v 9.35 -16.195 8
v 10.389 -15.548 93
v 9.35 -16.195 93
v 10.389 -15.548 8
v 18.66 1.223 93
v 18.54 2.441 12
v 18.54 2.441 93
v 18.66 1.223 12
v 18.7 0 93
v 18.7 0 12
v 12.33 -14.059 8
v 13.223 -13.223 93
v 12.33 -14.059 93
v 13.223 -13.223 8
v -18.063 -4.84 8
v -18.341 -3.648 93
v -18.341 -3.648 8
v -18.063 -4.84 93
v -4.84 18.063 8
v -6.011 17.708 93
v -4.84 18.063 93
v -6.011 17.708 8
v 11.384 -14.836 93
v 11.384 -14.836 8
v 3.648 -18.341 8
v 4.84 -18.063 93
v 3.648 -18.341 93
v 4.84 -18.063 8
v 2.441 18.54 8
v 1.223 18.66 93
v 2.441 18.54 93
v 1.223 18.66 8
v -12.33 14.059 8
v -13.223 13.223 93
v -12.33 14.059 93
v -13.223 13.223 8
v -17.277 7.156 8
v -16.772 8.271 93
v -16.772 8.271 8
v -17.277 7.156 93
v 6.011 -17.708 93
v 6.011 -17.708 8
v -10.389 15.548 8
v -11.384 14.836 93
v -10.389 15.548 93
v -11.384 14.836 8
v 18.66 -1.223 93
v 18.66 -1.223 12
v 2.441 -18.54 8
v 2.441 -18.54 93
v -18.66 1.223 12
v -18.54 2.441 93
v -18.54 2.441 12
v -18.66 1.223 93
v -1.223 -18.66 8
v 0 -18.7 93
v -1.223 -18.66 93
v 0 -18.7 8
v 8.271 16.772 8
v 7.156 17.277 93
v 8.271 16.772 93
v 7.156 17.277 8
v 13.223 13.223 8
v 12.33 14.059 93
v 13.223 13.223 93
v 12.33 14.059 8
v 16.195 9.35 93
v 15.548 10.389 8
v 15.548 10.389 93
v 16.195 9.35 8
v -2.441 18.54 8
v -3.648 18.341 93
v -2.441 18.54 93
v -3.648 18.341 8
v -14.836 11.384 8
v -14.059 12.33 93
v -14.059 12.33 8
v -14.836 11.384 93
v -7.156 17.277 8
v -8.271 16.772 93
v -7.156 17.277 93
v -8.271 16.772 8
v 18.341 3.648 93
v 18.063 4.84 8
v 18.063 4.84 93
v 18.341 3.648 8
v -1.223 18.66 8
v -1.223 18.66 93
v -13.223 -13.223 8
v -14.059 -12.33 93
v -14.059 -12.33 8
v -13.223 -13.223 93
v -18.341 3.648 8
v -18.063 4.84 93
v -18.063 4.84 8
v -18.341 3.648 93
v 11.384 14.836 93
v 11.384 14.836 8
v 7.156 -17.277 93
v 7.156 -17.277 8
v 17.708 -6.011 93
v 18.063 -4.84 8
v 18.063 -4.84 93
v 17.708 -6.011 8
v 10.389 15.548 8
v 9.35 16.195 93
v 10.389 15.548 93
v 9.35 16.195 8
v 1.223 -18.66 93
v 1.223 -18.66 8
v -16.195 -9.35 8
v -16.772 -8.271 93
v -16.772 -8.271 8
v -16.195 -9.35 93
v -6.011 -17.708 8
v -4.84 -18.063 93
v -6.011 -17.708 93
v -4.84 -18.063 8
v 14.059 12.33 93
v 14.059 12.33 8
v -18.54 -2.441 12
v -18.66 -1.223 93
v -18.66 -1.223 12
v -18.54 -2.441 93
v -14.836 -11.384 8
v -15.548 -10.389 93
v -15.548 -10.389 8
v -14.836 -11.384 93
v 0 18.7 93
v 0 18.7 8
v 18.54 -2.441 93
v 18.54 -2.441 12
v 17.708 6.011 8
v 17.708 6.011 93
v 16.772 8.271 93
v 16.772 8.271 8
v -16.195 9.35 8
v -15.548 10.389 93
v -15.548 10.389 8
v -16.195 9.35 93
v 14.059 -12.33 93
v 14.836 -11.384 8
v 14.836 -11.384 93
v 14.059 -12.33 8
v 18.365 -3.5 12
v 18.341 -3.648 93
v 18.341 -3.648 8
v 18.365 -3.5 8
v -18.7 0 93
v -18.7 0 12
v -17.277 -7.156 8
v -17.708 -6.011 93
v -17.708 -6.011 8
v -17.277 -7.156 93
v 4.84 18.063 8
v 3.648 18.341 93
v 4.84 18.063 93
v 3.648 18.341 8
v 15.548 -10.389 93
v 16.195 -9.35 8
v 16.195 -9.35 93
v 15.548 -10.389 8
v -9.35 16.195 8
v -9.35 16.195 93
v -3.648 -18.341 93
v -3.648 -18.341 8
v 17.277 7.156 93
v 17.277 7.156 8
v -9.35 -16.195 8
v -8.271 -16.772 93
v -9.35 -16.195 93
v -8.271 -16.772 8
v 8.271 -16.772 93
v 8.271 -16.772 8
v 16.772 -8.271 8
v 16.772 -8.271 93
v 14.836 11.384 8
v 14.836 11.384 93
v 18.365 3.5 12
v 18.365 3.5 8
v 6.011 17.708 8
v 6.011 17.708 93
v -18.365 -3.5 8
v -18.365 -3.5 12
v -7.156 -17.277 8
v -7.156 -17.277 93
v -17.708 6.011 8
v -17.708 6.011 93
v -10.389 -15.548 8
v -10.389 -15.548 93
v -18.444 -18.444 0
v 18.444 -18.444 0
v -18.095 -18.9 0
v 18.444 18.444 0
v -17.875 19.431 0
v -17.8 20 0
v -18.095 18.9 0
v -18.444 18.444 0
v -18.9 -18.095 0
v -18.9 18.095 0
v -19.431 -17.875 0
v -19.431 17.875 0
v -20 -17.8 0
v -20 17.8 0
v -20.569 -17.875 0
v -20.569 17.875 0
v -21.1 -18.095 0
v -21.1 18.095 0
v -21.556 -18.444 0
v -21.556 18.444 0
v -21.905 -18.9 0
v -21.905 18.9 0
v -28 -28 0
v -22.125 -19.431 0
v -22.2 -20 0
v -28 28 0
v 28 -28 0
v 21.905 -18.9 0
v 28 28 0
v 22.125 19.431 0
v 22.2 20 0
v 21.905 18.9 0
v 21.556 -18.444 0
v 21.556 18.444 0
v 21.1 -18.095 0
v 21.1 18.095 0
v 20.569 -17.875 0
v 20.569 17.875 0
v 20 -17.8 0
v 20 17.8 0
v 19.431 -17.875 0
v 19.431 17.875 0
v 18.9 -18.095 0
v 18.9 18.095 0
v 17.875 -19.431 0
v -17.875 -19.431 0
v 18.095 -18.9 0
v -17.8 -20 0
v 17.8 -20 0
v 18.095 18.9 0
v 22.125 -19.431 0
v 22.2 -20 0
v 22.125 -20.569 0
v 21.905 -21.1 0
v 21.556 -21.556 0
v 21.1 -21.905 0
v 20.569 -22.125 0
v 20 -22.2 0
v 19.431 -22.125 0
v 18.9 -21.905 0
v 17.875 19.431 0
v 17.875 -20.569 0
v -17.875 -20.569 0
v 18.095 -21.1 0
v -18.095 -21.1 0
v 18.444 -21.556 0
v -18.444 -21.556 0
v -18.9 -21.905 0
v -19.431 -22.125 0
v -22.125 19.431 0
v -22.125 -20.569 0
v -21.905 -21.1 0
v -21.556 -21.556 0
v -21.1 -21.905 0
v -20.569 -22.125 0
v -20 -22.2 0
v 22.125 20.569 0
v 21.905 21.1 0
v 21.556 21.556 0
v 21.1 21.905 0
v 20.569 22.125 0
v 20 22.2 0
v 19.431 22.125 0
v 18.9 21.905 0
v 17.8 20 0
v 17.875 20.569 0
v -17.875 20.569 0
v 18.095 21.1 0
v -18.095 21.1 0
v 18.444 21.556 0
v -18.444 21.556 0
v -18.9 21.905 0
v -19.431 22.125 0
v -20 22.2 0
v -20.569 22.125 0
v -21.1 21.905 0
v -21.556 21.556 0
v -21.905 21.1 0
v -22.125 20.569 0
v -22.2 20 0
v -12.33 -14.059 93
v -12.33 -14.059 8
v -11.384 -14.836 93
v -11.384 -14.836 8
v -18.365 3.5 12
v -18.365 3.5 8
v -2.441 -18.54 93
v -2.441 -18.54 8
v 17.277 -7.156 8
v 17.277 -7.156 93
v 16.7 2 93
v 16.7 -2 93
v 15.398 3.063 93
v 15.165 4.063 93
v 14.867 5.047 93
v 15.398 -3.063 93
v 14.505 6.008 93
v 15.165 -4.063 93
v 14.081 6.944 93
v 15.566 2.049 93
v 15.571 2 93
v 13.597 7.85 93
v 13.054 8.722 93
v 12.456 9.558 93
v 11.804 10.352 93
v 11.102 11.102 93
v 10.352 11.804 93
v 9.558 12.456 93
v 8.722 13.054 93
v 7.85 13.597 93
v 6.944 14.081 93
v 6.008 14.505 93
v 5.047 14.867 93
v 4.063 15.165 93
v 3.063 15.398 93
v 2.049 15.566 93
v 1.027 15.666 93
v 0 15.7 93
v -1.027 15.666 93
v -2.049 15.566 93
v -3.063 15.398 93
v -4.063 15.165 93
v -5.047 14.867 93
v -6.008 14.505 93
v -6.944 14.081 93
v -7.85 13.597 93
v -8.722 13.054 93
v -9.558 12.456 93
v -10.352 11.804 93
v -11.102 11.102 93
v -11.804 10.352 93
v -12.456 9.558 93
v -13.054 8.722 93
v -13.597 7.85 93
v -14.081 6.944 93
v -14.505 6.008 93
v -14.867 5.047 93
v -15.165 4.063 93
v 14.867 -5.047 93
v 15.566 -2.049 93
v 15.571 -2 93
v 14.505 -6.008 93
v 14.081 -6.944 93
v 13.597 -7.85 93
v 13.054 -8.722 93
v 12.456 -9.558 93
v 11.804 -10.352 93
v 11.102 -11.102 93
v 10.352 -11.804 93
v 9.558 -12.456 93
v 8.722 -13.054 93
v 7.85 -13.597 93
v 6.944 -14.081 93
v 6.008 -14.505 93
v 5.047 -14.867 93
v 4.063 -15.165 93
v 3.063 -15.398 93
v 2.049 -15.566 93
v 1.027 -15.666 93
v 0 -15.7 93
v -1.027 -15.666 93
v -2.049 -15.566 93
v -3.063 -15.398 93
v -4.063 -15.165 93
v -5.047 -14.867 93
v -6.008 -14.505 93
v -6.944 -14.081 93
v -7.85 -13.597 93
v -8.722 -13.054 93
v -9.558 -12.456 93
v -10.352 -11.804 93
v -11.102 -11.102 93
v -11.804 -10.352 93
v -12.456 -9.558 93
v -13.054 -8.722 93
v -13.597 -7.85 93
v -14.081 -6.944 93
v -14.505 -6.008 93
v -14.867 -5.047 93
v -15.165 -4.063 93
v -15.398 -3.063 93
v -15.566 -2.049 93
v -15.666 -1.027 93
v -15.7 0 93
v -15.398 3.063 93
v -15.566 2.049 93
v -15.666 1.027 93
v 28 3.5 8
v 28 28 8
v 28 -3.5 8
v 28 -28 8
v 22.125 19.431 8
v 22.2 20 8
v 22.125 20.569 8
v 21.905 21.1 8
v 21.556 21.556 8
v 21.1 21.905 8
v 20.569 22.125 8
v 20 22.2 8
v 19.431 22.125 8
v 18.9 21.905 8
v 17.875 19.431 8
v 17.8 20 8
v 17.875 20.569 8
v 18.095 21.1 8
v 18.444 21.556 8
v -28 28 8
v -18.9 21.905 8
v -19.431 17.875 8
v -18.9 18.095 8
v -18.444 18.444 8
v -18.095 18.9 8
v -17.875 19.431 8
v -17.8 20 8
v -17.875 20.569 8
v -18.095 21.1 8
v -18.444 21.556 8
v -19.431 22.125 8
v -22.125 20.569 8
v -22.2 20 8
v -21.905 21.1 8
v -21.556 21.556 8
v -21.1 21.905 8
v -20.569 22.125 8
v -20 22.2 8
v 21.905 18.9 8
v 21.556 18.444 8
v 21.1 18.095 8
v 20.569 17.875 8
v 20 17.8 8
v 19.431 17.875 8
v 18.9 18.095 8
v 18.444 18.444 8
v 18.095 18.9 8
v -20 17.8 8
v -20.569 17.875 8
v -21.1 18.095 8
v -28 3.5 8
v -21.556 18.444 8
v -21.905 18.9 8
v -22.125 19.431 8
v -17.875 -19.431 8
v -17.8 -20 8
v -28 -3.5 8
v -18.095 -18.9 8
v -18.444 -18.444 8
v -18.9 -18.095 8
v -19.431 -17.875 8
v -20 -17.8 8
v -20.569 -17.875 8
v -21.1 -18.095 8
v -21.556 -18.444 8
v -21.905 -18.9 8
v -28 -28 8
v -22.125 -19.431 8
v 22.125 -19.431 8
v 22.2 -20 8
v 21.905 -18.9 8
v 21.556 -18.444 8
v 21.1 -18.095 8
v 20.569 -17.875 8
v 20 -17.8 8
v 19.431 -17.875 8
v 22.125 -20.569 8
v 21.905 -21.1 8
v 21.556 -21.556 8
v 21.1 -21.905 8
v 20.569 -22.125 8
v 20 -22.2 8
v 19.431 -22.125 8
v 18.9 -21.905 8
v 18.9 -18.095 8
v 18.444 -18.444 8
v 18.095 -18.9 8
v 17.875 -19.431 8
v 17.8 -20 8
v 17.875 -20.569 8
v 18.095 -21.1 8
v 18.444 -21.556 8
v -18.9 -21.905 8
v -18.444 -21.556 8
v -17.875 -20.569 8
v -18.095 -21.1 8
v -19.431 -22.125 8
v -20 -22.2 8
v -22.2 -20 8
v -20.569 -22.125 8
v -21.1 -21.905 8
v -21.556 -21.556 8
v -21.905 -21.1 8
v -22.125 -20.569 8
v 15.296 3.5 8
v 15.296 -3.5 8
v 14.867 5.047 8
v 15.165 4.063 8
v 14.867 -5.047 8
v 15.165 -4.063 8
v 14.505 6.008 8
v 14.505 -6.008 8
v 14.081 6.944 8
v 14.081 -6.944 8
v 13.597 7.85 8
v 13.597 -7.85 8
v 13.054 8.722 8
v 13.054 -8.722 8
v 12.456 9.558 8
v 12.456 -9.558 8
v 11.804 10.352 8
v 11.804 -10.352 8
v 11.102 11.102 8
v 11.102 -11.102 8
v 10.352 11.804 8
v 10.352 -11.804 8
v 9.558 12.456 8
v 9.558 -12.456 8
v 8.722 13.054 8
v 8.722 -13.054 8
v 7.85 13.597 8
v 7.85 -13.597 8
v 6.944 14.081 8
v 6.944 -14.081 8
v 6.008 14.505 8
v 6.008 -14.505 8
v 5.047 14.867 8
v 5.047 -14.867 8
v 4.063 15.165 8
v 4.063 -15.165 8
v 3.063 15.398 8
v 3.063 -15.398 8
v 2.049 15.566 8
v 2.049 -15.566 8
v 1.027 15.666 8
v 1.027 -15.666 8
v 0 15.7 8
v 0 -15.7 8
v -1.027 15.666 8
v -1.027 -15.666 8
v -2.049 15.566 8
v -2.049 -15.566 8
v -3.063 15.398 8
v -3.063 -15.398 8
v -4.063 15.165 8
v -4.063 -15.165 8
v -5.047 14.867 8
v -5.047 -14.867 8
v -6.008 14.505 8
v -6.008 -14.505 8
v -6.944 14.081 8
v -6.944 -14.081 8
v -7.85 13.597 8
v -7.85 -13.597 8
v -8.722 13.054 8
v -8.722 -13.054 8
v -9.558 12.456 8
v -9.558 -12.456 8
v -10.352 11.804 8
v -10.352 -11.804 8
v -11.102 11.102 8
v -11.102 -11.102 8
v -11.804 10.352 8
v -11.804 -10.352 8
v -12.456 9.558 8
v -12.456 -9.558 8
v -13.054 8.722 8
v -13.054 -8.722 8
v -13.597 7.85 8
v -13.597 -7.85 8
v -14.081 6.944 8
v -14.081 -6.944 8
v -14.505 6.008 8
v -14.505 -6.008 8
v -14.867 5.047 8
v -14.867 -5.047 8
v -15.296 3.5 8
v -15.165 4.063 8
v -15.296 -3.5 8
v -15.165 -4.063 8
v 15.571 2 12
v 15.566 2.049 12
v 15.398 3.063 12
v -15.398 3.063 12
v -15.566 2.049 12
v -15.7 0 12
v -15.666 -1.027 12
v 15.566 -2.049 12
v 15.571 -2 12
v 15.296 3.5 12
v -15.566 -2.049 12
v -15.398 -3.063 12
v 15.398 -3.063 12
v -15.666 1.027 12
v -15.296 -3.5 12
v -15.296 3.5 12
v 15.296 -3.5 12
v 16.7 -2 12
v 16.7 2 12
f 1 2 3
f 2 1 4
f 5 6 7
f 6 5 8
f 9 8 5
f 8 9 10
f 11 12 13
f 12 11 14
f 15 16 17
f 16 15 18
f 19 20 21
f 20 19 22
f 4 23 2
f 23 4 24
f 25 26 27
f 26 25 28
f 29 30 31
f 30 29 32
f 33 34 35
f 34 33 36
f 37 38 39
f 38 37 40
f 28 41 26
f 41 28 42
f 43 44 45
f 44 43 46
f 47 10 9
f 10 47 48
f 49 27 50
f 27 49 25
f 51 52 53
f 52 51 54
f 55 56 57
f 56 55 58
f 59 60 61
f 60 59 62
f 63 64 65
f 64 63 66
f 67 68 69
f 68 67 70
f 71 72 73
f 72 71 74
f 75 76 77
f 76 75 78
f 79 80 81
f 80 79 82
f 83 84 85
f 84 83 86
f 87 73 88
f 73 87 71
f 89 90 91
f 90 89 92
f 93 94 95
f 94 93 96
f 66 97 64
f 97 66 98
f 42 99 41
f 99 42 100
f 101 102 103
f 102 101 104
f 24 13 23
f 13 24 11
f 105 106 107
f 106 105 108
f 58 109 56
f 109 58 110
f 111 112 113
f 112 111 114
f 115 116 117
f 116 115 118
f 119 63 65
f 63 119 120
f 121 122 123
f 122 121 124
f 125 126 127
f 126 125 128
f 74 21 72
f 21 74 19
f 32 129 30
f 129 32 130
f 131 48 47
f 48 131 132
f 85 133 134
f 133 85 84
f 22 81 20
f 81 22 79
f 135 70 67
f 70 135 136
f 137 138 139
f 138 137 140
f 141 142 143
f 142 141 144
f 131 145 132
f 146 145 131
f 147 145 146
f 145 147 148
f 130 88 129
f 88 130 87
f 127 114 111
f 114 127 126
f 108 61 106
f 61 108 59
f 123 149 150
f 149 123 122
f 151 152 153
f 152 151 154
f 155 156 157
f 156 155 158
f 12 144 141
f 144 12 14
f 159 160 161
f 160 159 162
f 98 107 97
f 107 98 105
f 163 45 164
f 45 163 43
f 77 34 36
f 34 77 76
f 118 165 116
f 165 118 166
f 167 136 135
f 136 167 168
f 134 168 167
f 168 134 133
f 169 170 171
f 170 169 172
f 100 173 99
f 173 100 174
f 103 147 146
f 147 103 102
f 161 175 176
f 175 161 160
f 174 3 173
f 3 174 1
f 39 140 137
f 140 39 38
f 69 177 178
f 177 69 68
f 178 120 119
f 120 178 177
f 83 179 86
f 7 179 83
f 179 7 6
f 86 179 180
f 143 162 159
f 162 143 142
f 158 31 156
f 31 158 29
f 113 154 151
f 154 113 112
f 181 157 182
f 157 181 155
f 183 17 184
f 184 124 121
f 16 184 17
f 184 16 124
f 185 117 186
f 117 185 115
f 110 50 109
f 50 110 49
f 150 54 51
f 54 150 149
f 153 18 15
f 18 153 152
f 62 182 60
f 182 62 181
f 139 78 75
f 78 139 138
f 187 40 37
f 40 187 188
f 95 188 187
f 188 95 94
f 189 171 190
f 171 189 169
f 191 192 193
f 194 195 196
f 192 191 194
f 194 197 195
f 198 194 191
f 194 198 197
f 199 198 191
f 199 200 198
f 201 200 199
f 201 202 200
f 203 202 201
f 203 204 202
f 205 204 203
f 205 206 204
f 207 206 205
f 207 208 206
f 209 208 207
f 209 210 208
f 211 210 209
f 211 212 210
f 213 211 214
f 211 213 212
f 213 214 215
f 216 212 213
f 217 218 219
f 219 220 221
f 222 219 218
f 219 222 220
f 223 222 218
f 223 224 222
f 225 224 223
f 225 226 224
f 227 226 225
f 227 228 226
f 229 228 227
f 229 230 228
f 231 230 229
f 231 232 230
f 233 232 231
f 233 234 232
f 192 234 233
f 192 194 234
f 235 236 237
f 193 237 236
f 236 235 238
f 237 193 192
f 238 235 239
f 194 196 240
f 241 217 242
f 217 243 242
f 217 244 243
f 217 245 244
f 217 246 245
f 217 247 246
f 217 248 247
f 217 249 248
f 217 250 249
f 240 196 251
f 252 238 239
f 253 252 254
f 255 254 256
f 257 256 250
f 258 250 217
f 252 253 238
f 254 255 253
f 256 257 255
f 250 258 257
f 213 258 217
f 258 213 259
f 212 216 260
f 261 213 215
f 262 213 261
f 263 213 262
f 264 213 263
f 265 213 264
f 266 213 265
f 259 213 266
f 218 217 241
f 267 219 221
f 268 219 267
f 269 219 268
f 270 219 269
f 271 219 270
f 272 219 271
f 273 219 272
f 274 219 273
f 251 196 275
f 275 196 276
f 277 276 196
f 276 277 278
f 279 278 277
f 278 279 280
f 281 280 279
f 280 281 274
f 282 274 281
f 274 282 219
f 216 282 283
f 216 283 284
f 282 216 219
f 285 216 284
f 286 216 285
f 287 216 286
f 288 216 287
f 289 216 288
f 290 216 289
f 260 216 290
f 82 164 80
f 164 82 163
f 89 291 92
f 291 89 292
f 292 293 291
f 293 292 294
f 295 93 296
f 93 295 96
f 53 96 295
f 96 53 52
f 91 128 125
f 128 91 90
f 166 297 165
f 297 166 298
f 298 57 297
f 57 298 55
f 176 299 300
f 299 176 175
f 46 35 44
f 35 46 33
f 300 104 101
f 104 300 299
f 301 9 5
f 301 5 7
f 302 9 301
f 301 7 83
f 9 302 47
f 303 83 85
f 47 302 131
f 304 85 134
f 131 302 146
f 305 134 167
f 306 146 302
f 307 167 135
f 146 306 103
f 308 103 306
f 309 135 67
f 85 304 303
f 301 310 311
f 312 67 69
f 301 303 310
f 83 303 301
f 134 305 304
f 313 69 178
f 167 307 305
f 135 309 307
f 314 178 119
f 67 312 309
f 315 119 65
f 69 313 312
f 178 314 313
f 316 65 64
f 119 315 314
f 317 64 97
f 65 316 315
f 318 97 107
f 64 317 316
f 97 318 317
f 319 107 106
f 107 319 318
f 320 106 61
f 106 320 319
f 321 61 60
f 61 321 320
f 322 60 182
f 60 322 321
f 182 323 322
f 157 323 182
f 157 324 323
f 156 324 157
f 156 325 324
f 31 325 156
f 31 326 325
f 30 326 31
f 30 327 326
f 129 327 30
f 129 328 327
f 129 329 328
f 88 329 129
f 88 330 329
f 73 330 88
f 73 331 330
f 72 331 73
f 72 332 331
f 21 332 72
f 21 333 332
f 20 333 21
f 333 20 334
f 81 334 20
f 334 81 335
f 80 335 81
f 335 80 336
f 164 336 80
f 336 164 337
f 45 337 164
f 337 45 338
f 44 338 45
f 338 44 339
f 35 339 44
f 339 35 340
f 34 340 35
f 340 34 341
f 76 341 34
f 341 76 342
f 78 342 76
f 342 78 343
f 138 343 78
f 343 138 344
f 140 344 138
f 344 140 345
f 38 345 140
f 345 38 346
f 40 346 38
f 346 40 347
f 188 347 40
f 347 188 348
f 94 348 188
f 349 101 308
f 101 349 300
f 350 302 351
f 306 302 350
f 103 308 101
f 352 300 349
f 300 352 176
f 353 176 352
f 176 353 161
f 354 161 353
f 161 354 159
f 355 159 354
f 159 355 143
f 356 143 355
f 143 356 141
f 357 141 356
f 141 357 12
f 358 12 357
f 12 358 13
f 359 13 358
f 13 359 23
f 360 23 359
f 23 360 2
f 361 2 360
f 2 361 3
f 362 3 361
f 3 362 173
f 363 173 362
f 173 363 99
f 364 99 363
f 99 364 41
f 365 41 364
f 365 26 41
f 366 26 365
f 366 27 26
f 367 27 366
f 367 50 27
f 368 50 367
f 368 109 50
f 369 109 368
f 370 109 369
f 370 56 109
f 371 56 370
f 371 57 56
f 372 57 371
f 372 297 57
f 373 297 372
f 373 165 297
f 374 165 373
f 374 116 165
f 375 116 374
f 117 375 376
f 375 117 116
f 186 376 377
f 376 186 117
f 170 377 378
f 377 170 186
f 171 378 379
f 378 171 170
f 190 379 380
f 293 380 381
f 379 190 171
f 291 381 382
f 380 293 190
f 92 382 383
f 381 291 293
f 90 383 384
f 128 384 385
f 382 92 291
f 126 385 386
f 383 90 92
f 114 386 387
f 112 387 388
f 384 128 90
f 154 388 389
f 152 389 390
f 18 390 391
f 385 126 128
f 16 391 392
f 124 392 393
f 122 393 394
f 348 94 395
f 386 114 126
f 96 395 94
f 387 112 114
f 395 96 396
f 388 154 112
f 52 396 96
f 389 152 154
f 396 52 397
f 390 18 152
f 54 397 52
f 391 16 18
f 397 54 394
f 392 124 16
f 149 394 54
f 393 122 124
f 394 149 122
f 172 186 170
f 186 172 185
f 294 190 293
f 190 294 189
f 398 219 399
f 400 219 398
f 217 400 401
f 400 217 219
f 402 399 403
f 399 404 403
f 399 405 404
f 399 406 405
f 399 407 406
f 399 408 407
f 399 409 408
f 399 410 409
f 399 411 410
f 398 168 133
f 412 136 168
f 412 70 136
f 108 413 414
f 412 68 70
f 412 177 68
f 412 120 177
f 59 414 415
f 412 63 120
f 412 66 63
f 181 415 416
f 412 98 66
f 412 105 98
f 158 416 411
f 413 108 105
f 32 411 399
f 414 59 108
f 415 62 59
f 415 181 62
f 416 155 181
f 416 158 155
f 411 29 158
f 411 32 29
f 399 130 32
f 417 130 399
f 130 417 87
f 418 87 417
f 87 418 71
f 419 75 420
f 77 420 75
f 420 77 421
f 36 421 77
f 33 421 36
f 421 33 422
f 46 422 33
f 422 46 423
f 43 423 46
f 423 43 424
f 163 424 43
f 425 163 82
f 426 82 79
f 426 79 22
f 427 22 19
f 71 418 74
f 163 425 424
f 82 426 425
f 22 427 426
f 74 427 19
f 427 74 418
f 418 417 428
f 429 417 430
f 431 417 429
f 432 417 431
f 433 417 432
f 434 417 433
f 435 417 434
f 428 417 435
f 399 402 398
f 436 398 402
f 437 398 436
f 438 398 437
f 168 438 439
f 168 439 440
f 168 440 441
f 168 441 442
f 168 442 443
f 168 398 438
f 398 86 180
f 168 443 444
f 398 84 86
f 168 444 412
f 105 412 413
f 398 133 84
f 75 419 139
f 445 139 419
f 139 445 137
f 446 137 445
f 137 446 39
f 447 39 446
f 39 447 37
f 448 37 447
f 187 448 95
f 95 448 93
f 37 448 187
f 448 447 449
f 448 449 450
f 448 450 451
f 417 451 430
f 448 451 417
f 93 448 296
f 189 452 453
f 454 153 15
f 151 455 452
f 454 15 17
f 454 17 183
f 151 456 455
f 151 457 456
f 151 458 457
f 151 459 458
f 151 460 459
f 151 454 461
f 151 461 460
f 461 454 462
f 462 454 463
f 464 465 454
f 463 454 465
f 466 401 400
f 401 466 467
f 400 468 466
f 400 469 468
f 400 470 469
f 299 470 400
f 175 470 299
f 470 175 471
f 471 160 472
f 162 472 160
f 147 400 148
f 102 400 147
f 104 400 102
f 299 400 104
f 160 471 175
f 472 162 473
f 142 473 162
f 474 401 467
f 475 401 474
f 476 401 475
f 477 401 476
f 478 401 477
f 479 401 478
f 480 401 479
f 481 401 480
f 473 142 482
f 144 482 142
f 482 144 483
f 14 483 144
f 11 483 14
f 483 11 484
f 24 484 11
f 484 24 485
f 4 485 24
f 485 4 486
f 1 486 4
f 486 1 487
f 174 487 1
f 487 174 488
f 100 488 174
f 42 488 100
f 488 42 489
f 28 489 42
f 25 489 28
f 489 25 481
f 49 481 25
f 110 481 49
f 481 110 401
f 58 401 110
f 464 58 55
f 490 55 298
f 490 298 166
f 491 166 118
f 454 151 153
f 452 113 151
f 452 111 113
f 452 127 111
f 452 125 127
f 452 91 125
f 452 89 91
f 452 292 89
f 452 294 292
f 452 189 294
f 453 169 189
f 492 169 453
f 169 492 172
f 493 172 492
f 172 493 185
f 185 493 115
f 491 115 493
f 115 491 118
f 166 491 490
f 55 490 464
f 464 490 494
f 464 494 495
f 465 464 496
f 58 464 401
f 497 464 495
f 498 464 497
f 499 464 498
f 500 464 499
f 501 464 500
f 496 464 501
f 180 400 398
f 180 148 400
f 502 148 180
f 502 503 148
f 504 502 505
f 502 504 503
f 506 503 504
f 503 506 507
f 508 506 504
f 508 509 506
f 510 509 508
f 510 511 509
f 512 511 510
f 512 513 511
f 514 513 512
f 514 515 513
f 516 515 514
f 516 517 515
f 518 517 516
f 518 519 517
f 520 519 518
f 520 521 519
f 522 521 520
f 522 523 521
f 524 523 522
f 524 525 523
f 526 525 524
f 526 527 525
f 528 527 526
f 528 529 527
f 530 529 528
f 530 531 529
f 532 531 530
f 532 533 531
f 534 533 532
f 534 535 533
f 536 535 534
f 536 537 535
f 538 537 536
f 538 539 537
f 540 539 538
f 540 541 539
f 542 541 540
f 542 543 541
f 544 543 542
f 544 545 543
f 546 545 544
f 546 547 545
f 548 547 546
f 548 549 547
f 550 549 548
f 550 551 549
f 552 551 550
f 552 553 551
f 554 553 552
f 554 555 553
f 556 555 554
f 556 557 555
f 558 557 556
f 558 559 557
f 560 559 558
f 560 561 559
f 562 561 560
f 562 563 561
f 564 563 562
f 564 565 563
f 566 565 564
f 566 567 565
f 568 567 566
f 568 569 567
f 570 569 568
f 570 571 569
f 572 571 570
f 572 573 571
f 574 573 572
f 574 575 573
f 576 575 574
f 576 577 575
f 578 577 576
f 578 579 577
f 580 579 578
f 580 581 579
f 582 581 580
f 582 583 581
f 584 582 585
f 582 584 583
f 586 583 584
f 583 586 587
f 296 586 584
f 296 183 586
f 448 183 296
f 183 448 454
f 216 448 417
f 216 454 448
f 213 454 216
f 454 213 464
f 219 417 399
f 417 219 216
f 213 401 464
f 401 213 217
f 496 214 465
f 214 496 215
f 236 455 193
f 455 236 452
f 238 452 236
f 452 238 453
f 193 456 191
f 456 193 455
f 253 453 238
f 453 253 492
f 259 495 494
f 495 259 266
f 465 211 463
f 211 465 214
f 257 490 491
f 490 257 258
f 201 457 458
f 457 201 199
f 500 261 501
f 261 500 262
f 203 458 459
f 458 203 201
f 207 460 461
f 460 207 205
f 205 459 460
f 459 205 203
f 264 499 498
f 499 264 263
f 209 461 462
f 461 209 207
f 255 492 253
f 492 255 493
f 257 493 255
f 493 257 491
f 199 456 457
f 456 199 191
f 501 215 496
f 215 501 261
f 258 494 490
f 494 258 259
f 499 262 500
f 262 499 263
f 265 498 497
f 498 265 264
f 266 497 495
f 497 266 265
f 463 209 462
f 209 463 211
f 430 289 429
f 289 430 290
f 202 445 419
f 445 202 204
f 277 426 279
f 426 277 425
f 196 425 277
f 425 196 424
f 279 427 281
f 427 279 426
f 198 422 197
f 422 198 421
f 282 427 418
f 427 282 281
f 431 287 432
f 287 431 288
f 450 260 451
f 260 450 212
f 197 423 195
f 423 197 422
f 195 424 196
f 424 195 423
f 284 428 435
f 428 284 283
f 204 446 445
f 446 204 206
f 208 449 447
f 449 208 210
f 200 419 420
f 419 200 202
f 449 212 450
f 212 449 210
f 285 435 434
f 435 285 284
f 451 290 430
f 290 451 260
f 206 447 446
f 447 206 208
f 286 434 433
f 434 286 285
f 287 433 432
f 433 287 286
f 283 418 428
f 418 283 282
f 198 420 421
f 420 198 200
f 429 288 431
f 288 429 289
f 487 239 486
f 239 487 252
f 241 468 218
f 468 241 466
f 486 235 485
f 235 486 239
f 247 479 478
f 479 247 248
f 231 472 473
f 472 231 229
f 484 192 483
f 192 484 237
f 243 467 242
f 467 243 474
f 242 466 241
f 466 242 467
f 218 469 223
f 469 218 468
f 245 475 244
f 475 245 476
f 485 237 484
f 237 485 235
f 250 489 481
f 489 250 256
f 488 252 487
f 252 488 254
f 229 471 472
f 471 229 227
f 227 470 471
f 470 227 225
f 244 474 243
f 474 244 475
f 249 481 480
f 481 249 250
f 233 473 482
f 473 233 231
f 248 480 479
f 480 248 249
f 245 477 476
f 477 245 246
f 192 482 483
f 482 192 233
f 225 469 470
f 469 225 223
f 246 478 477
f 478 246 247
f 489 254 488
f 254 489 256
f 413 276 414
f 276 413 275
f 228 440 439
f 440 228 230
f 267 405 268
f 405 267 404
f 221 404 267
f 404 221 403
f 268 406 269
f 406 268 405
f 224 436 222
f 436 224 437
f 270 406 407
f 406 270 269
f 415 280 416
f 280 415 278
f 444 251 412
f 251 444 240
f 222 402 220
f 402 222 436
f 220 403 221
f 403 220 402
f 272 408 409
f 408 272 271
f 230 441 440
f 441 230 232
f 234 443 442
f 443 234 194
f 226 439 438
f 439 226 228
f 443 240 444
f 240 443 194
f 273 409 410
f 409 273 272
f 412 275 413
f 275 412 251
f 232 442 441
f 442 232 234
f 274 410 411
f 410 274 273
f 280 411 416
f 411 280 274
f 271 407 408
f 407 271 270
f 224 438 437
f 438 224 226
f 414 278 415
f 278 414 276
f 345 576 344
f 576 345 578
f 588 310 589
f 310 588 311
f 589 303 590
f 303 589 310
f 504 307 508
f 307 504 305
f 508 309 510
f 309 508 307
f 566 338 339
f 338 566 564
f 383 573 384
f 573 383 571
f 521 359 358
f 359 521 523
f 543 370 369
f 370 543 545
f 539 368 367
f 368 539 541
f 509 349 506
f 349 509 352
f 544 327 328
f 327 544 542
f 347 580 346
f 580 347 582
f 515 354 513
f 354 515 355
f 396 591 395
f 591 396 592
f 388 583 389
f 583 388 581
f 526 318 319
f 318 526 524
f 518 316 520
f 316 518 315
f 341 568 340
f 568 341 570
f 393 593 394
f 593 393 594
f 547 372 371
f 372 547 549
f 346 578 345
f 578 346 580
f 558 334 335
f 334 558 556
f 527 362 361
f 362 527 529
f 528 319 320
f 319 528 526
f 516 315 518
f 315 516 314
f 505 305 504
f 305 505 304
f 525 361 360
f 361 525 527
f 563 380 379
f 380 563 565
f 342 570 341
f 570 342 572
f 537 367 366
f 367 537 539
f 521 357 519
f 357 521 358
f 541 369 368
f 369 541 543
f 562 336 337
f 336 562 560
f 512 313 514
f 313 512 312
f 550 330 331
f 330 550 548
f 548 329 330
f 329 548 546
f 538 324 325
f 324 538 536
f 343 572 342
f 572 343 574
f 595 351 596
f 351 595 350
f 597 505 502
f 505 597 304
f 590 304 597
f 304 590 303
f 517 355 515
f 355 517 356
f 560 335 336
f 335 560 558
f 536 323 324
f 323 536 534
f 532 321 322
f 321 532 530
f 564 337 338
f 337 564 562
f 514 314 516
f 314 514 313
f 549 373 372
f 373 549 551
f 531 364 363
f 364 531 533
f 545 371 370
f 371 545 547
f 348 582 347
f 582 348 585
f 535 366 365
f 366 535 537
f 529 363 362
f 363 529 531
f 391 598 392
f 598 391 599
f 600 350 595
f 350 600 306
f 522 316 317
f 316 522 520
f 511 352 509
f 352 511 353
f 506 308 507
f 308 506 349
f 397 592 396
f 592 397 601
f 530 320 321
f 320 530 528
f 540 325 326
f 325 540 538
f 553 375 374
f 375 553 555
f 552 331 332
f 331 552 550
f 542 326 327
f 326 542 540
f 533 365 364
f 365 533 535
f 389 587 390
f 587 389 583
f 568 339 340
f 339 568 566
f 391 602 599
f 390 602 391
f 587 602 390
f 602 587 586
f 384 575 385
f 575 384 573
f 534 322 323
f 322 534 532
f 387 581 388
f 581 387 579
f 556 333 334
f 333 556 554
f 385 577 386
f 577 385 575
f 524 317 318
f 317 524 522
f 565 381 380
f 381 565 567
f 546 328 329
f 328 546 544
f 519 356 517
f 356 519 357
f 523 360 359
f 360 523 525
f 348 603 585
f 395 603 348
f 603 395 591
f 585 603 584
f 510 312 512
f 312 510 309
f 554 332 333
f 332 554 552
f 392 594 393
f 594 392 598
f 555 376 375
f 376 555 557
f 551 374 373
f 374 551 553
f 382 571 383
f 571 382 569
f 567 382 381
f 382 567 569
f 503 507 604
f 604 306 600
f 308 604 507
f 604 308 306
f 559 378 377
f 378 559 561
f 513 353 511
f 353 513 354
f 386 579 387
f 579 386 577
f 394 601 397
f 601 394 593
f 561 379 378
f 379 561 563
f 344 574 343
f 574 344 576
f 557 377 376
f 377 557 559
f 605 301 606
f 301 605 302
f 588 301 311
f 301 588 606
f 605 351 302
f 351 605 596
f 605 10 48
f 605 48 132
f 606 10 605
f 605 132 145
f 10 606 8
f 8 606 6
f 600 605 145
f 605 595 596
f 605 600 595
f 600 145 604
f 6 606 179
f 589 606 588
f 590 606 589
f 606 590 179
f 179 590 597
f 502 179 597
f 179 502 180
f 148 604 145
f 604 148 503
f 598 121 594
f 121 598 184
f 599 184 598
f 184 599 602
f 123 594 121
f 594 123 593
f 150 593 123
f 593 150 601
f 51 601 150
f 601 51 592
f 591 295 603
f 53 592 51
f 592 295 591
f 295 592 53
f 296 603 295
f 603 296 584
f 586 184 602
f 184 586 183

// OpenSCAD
// Scoudouc 0 thrust stand: motor CUP (OpenSCAD), nozzle-UP layout. Replaces holder.scad.
// The motor stands upright, nozzle up. Its base sits on the thick floor of this cup; the floor sits on the
// load cell (bolted to the cell's platform through the square flange, or just resting flat on a button cell).
// Thrust pushes DOWN, through the floor, into the cell. The walls only keep the motor upright and carry NO load.
//
// Print: PLA, flange down (as modelled), no supports, 4 perimeters, 40% infill, 0.2 mm layers.
// Printer: LIBRARY (Prusa MK3). Estimated 2.5 to 3.2 h on an MK3 (see README for each size). Prints upright; the open top is the last layer.
// HEAT: PLA softens near a hot casing. Line the bore with a cardboard tube (liner_t thick, e.g. rolled kraft
// paper or a spare casing wrap). The cup is a CONSUMABLE: inspect after every burn, bin it if it is soft or warped.

motor_d    = 29;    // motor casing diameter in mm: 24 or 29 (18 also allowed, e.g. for C6)
holder_len = 85;    // depth of the bore above the floor in mm, 70 to 100 (motor sticks out of the top if longer)
clearance  = 0.4;   // extra gap so the lined motor slides in (raise if your printer is tight)
liner_t    = 1.0;   // thickness of the cardboard liner in mm (bore grows by 2 x this)
wall       = 3;     // cup wall thickness in mm
plate_t    = 8;     // thick floor AND flange thickness in mm: the motor's base pushes on the cell through this
bolt_sq    = 40;    // M4 bolt holes sit on a square this wide (match your load cell platform)
bolt_d     = 4.4;   // M4 clearance hole
flange_w   = 56;    // square bottom flange width
lead_slot  = 7;     // width of the side notch at the base for igniter leads (and the opposite vent notch)
lead_h     = 4;     // height of those notches above the floor
groove_w   = 4;     // vertical groove behind the liner that the leads run down
groove_d   = 1.2;   // how deep that groove cuts into the wall
bolt_holes = true;  // false = plain flat bottom for a button cell (no holes)
vent_notch = true;  // opposite-side notch so gas can leave sideways at the base

assert(motor_d == 18 || motor_d == 24 || motor_d == 29, "motor_d must be 18, 24 or 29");
assert(holder_len >= 70 && holder_len <= 100, "holder_len must be between 70 and 100 mm");

bore  = motor_d + 2 * liner_t + clearance;
outer = bore + 2 * wall;
top   = plate_t + holder_len;
$fn = 96;

module cup() {
  difference() {
    union() {
      cylinder(d = outer, h = top);                                   // the cup wall
      translate([-flange_w / 2, -flange_w / 2, 0])
        cube([flange_w, flange_w, plate_t]);                          // flange at the BOTTOM
    }
    translate([0, 0, plate_t]) cylinder(d = bore, h = holder_len + 1);  // bore, open top, floor left solid
    // groove behind the liner for the leads (+X side), top to floor
    translate([bore / 2 - groove_d, -groove_w / 2, plate_t]) cube([groove_d + 1, groove_w, holder_len + 1]);
    // side notch through the wall at the base: igniter leads leave here (+X)
    translate([bore / 2 - groove_d, -lead_slot / 2, plate_t]) cube([outer, lead_slot, lead_h]);
    // opposite-side vent notch (-X)
    if (vent_notch)
      translate([-(bore / 2 - groove_d) - outer, -lead_slot / 2, plate_t]) cube([outer, lead_slot, lead_h]);
    // four M4 mounting holes through the flange
    if (bolt_holes)
      for (x = [-1, 1], y = [-1, 1])
        translate([x * bolt_sq / 2, y * bolt_sq / 2, -1]) cylinder(d = bolt_d, h = plate_t + 2, $fn = 24);
  }
}

cup();
